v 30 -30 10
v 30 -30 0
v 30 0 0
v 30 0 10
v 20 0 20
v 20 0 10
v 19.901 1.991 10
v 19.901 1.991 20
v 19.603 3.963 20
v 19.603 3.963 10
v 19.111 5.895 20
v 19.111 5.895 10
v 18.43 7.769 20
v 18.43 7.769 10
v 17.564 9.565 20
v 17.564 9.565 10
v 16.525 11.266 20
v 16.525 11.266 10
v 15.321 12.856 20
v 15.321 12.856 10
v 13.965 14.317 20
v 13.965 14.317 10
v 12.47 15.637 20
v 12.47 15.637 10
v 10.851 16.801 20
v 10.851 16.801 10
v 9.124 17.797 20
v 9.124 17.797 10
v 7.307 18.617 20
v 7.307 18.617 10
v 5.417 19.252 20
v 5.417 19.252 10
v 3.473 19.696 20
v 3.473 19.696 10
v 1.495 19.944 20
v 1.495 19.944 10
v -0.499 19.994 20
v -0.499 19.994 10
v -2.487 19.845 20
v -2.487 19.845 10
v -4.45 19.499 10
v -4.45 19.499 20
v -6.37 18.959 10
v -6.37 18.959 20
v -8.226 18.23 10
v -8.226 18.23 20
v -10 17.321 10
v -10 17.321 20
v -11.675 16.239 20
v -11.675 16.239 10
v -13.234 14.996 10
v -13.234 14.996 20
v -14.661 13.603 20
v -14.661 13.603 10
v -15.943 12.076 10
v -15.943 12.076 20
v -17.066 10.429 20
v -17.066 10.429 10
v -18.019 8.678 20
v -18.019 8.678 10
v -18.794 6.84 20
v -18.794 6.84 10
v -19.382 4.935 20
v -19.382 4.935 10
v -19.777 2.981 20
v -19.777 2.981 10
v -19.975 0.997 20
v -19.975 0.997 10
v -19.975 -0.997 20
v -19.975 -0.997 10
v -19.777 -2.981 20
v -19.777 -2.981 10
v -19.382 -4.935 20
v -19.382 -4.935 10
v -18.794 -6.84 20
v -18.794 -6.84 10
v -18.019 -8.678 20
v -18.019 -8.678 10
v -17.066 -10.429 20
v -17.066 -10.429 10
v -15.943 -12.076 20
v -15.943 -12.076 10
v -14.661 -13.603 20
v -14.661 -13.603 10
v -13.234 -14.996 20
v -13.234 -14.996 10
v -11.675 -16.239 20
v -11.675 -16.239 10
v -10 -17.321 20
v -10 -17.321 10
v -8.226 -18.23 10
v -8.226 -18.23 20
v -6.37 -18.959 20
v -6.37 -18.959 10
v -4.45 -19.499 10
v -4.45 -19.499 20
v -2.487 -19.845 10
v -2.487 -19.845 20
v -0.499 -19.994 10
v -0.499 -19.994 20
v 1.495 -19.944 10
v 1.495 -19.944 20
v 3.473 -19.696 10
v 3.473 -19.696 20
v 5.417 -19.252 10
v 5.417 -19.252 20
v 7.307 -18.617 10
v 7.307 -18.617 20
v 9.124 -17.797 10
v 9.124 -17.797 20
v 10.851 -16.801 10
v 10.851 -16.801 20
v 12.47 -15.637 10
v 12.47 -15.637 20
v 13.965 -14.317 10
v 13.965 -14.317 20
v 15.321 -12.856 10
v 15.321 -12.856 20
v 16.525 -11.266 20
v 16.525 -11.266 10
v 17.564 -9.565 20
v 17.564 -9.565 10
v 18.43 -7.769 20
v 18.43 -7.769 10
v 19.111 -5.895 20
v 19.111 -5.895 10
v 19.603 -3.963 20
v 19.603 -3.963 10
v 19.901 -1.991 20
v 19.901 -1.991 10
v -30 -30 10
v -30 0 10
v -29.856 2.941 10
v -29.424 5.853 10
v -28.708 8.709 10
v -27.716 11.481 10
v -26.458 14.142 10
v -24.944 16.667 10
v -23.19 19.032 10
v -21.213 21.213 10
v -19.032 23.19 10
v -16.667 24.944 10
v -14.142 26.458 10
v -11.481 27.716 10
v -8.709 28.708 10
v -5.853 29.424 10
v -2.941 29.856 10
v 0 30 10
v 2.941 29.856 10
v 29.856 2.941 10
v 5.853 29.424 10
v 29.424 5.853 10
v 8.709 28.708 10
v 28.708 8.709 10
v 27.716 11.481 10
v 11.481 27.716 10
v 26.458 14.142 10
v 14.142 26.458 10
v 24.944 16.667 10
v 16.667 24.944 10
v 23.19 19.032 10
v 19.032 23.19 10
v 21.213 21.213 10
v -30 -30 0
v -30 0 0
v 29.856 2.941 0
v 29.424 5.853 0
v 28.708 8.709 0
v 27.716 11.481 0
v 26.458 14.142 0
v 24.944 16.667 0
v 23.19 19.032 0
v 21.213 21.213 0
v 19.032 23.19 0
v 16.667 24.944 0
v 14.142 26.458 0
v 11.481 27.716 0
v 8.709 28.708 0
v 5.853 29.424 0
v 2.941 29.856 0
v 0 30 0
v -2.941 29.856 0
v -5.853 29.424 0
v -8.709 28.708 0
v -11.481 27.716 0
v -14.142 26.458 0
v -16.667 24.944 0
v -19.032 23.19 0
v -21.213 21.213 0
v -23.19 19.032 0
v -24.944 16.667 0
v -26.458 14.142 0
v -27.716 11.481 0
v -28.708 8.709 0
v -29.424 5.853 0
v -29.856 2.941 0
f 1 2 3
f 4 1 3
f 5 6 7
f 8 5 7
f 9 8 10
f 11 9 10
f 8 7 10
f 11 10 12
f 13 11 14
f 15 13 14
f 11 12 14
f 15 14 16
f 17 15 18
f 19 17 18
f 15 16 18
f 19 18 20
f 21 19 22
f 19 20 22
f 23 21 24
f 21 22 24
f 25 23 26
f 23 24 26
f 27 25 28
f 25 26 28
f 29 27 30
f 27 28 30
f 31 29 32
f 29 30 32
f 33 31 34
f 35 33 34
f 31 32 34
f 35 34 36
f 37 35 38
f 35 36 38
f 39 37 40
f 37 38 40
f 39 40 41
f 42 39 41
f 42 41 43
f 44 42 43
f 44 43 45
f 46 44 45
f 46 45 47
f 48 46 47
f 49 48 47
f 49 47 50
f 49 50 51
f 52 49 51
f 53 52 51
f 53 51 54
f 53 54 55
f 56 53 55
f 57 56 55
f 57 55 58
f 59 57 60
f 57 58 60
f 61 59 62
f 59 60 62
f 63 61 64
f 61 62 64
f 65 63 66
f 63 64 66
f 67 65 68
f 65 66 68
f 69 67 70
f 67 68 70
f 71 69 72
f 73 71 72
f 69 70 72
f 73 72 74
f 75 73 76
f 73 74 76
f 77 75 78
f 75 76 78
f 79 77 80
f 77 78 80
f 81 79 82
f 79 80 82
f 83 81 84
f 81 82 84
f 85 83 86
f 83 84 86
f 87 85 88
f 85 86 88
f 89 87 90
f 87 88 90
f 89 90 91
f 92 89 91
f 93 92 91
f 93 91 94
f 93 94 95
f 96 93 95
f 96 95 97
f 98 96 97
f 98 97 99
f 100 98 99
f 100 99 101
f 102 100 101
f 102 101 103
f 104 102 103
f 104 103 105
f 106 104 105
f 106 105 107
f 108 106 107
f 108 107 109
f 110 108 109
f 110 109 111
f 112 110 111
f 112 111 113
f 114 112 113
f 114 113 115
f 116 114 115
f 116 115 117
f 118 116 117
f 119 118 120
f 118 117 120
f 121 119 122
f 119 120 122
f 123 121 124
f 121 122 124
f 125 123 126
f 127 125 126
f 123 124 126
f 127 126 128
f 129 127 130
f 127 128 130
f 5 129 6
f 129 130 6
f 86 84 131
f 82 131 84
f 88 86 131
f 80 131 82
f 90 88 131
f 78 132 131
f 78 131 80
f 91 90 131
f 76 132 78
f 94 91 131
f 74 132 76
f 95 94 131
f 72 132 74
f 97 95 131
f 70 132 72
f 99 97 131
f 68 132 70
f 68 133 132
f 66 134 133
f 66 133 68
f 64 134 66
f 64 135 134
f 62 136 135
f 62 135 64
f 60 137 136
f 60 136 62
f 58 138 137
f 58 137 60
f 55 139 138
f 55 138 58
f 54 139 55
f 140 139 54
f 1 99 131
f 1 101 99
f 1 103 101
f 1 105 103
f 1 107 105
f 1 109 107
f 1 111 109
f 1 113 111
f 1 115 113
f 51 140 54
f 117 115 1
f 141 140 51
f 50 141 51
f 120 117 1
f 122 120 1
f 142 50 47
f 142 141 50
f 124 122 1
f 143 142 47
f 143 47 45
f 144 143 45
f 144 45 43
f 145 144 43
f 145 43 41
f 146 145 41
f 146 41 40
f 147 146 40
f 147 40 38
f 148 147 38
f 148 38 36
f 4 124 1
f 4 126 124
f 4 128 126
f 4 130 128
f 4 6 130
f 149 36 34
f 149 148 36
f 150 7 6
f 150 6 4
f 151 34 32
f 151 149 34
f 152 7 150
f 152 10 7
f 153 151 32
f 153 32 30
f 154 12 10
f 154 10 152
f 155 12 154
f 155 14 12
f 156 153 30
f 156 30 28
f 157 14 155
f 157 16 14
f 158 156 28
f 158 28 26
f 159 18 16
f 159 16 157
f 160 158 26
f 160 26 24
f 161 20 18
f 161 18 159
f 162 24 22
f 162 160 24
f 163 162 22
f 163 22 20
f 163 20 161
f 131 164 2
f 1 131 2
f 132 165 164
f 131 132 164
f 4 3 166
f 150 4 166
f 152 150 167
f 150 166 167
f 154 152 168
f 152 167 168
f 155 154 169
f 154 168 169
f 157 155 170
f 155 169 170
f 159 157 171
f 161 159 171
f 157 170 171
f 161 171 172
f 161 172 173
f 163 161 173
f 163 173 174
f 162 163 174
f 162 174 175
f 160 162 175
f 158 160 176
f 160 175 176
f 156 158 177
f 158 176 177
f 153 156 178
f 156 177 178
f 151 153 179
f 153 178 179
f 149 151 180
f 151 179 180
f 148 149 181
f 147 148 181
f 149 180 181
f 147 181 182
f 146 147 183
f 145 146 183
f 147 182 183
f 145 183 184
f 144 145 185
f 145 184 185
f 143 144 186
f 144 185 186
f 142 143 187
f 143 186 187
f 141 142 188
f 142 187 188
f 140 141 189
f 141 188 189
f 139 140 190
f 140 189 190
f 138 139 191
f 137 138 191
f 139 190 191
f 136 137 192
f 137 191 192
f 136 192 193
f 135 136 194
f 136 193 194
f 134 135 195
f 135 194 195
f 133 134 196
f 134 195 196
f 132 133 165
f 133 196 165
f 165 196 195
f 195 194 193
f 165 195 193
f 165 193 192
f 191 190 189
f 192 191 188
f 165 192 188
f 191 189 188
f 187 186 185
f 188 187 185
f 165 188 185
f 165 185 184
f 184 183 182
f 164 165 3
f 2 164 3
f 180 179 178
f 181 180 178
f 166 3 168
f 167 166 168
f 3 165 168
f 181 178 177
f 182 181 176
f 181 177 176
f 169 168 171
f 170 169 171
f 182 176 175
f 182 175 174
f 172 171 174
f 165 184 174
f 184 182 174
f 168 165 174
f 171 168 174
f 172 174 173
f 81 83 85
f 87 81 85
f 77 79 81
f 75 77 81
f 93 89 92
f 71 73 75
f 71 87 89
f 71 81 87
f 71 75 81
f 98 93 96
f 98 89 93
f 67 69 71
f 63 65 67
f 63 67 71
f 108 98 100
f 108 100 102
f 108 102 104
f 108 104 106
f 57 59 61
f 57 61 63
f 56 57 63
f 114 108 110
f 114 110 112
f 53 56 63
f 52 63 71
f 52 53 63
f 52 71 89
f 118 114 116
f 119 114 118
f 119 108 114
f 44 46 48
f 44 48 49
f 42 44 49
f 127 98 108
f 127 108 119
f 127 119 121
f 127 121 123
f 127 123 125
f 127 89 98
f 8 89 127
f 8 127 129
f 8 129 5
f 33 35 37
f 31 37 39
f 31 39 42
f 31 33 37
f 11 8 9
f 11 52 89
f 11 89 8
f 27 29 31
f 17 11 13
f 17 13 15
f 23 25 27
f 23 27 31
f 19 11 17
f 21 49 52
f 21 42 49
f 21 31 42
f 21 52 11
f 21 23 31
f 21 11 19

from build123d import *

# Parameters (mm, degrees)
EXTRUDE_1_DEPTH = 10
SKETCH_2_R      = 20
EXTRUDE_2_DEPTH = 10


with BuildPart() as part:
    # 草图1 → 凸台-拉伸1 (new body)
    with BuildSketch(Plane.XY):
        with BuildLine():
            Line((-30, 0), (-30, -30))
            Line((-30, -30), (30, -30))
            Line((30, -30), (30, 0))
            ThreePointArc((30, 0), (0, 30), (-30, 0))
        make_face()
    extrude(amount=EXTRUDE_1_DEPTH)

    # 草图2 → 凸台-拉伸2 (add)
    with BuildSketch(Plane.XY.offset(10)):
        Circle(SKETCH_2_R)
    extrude(amount=EXTRUDE_2_DEPTH)


solid = part.part
